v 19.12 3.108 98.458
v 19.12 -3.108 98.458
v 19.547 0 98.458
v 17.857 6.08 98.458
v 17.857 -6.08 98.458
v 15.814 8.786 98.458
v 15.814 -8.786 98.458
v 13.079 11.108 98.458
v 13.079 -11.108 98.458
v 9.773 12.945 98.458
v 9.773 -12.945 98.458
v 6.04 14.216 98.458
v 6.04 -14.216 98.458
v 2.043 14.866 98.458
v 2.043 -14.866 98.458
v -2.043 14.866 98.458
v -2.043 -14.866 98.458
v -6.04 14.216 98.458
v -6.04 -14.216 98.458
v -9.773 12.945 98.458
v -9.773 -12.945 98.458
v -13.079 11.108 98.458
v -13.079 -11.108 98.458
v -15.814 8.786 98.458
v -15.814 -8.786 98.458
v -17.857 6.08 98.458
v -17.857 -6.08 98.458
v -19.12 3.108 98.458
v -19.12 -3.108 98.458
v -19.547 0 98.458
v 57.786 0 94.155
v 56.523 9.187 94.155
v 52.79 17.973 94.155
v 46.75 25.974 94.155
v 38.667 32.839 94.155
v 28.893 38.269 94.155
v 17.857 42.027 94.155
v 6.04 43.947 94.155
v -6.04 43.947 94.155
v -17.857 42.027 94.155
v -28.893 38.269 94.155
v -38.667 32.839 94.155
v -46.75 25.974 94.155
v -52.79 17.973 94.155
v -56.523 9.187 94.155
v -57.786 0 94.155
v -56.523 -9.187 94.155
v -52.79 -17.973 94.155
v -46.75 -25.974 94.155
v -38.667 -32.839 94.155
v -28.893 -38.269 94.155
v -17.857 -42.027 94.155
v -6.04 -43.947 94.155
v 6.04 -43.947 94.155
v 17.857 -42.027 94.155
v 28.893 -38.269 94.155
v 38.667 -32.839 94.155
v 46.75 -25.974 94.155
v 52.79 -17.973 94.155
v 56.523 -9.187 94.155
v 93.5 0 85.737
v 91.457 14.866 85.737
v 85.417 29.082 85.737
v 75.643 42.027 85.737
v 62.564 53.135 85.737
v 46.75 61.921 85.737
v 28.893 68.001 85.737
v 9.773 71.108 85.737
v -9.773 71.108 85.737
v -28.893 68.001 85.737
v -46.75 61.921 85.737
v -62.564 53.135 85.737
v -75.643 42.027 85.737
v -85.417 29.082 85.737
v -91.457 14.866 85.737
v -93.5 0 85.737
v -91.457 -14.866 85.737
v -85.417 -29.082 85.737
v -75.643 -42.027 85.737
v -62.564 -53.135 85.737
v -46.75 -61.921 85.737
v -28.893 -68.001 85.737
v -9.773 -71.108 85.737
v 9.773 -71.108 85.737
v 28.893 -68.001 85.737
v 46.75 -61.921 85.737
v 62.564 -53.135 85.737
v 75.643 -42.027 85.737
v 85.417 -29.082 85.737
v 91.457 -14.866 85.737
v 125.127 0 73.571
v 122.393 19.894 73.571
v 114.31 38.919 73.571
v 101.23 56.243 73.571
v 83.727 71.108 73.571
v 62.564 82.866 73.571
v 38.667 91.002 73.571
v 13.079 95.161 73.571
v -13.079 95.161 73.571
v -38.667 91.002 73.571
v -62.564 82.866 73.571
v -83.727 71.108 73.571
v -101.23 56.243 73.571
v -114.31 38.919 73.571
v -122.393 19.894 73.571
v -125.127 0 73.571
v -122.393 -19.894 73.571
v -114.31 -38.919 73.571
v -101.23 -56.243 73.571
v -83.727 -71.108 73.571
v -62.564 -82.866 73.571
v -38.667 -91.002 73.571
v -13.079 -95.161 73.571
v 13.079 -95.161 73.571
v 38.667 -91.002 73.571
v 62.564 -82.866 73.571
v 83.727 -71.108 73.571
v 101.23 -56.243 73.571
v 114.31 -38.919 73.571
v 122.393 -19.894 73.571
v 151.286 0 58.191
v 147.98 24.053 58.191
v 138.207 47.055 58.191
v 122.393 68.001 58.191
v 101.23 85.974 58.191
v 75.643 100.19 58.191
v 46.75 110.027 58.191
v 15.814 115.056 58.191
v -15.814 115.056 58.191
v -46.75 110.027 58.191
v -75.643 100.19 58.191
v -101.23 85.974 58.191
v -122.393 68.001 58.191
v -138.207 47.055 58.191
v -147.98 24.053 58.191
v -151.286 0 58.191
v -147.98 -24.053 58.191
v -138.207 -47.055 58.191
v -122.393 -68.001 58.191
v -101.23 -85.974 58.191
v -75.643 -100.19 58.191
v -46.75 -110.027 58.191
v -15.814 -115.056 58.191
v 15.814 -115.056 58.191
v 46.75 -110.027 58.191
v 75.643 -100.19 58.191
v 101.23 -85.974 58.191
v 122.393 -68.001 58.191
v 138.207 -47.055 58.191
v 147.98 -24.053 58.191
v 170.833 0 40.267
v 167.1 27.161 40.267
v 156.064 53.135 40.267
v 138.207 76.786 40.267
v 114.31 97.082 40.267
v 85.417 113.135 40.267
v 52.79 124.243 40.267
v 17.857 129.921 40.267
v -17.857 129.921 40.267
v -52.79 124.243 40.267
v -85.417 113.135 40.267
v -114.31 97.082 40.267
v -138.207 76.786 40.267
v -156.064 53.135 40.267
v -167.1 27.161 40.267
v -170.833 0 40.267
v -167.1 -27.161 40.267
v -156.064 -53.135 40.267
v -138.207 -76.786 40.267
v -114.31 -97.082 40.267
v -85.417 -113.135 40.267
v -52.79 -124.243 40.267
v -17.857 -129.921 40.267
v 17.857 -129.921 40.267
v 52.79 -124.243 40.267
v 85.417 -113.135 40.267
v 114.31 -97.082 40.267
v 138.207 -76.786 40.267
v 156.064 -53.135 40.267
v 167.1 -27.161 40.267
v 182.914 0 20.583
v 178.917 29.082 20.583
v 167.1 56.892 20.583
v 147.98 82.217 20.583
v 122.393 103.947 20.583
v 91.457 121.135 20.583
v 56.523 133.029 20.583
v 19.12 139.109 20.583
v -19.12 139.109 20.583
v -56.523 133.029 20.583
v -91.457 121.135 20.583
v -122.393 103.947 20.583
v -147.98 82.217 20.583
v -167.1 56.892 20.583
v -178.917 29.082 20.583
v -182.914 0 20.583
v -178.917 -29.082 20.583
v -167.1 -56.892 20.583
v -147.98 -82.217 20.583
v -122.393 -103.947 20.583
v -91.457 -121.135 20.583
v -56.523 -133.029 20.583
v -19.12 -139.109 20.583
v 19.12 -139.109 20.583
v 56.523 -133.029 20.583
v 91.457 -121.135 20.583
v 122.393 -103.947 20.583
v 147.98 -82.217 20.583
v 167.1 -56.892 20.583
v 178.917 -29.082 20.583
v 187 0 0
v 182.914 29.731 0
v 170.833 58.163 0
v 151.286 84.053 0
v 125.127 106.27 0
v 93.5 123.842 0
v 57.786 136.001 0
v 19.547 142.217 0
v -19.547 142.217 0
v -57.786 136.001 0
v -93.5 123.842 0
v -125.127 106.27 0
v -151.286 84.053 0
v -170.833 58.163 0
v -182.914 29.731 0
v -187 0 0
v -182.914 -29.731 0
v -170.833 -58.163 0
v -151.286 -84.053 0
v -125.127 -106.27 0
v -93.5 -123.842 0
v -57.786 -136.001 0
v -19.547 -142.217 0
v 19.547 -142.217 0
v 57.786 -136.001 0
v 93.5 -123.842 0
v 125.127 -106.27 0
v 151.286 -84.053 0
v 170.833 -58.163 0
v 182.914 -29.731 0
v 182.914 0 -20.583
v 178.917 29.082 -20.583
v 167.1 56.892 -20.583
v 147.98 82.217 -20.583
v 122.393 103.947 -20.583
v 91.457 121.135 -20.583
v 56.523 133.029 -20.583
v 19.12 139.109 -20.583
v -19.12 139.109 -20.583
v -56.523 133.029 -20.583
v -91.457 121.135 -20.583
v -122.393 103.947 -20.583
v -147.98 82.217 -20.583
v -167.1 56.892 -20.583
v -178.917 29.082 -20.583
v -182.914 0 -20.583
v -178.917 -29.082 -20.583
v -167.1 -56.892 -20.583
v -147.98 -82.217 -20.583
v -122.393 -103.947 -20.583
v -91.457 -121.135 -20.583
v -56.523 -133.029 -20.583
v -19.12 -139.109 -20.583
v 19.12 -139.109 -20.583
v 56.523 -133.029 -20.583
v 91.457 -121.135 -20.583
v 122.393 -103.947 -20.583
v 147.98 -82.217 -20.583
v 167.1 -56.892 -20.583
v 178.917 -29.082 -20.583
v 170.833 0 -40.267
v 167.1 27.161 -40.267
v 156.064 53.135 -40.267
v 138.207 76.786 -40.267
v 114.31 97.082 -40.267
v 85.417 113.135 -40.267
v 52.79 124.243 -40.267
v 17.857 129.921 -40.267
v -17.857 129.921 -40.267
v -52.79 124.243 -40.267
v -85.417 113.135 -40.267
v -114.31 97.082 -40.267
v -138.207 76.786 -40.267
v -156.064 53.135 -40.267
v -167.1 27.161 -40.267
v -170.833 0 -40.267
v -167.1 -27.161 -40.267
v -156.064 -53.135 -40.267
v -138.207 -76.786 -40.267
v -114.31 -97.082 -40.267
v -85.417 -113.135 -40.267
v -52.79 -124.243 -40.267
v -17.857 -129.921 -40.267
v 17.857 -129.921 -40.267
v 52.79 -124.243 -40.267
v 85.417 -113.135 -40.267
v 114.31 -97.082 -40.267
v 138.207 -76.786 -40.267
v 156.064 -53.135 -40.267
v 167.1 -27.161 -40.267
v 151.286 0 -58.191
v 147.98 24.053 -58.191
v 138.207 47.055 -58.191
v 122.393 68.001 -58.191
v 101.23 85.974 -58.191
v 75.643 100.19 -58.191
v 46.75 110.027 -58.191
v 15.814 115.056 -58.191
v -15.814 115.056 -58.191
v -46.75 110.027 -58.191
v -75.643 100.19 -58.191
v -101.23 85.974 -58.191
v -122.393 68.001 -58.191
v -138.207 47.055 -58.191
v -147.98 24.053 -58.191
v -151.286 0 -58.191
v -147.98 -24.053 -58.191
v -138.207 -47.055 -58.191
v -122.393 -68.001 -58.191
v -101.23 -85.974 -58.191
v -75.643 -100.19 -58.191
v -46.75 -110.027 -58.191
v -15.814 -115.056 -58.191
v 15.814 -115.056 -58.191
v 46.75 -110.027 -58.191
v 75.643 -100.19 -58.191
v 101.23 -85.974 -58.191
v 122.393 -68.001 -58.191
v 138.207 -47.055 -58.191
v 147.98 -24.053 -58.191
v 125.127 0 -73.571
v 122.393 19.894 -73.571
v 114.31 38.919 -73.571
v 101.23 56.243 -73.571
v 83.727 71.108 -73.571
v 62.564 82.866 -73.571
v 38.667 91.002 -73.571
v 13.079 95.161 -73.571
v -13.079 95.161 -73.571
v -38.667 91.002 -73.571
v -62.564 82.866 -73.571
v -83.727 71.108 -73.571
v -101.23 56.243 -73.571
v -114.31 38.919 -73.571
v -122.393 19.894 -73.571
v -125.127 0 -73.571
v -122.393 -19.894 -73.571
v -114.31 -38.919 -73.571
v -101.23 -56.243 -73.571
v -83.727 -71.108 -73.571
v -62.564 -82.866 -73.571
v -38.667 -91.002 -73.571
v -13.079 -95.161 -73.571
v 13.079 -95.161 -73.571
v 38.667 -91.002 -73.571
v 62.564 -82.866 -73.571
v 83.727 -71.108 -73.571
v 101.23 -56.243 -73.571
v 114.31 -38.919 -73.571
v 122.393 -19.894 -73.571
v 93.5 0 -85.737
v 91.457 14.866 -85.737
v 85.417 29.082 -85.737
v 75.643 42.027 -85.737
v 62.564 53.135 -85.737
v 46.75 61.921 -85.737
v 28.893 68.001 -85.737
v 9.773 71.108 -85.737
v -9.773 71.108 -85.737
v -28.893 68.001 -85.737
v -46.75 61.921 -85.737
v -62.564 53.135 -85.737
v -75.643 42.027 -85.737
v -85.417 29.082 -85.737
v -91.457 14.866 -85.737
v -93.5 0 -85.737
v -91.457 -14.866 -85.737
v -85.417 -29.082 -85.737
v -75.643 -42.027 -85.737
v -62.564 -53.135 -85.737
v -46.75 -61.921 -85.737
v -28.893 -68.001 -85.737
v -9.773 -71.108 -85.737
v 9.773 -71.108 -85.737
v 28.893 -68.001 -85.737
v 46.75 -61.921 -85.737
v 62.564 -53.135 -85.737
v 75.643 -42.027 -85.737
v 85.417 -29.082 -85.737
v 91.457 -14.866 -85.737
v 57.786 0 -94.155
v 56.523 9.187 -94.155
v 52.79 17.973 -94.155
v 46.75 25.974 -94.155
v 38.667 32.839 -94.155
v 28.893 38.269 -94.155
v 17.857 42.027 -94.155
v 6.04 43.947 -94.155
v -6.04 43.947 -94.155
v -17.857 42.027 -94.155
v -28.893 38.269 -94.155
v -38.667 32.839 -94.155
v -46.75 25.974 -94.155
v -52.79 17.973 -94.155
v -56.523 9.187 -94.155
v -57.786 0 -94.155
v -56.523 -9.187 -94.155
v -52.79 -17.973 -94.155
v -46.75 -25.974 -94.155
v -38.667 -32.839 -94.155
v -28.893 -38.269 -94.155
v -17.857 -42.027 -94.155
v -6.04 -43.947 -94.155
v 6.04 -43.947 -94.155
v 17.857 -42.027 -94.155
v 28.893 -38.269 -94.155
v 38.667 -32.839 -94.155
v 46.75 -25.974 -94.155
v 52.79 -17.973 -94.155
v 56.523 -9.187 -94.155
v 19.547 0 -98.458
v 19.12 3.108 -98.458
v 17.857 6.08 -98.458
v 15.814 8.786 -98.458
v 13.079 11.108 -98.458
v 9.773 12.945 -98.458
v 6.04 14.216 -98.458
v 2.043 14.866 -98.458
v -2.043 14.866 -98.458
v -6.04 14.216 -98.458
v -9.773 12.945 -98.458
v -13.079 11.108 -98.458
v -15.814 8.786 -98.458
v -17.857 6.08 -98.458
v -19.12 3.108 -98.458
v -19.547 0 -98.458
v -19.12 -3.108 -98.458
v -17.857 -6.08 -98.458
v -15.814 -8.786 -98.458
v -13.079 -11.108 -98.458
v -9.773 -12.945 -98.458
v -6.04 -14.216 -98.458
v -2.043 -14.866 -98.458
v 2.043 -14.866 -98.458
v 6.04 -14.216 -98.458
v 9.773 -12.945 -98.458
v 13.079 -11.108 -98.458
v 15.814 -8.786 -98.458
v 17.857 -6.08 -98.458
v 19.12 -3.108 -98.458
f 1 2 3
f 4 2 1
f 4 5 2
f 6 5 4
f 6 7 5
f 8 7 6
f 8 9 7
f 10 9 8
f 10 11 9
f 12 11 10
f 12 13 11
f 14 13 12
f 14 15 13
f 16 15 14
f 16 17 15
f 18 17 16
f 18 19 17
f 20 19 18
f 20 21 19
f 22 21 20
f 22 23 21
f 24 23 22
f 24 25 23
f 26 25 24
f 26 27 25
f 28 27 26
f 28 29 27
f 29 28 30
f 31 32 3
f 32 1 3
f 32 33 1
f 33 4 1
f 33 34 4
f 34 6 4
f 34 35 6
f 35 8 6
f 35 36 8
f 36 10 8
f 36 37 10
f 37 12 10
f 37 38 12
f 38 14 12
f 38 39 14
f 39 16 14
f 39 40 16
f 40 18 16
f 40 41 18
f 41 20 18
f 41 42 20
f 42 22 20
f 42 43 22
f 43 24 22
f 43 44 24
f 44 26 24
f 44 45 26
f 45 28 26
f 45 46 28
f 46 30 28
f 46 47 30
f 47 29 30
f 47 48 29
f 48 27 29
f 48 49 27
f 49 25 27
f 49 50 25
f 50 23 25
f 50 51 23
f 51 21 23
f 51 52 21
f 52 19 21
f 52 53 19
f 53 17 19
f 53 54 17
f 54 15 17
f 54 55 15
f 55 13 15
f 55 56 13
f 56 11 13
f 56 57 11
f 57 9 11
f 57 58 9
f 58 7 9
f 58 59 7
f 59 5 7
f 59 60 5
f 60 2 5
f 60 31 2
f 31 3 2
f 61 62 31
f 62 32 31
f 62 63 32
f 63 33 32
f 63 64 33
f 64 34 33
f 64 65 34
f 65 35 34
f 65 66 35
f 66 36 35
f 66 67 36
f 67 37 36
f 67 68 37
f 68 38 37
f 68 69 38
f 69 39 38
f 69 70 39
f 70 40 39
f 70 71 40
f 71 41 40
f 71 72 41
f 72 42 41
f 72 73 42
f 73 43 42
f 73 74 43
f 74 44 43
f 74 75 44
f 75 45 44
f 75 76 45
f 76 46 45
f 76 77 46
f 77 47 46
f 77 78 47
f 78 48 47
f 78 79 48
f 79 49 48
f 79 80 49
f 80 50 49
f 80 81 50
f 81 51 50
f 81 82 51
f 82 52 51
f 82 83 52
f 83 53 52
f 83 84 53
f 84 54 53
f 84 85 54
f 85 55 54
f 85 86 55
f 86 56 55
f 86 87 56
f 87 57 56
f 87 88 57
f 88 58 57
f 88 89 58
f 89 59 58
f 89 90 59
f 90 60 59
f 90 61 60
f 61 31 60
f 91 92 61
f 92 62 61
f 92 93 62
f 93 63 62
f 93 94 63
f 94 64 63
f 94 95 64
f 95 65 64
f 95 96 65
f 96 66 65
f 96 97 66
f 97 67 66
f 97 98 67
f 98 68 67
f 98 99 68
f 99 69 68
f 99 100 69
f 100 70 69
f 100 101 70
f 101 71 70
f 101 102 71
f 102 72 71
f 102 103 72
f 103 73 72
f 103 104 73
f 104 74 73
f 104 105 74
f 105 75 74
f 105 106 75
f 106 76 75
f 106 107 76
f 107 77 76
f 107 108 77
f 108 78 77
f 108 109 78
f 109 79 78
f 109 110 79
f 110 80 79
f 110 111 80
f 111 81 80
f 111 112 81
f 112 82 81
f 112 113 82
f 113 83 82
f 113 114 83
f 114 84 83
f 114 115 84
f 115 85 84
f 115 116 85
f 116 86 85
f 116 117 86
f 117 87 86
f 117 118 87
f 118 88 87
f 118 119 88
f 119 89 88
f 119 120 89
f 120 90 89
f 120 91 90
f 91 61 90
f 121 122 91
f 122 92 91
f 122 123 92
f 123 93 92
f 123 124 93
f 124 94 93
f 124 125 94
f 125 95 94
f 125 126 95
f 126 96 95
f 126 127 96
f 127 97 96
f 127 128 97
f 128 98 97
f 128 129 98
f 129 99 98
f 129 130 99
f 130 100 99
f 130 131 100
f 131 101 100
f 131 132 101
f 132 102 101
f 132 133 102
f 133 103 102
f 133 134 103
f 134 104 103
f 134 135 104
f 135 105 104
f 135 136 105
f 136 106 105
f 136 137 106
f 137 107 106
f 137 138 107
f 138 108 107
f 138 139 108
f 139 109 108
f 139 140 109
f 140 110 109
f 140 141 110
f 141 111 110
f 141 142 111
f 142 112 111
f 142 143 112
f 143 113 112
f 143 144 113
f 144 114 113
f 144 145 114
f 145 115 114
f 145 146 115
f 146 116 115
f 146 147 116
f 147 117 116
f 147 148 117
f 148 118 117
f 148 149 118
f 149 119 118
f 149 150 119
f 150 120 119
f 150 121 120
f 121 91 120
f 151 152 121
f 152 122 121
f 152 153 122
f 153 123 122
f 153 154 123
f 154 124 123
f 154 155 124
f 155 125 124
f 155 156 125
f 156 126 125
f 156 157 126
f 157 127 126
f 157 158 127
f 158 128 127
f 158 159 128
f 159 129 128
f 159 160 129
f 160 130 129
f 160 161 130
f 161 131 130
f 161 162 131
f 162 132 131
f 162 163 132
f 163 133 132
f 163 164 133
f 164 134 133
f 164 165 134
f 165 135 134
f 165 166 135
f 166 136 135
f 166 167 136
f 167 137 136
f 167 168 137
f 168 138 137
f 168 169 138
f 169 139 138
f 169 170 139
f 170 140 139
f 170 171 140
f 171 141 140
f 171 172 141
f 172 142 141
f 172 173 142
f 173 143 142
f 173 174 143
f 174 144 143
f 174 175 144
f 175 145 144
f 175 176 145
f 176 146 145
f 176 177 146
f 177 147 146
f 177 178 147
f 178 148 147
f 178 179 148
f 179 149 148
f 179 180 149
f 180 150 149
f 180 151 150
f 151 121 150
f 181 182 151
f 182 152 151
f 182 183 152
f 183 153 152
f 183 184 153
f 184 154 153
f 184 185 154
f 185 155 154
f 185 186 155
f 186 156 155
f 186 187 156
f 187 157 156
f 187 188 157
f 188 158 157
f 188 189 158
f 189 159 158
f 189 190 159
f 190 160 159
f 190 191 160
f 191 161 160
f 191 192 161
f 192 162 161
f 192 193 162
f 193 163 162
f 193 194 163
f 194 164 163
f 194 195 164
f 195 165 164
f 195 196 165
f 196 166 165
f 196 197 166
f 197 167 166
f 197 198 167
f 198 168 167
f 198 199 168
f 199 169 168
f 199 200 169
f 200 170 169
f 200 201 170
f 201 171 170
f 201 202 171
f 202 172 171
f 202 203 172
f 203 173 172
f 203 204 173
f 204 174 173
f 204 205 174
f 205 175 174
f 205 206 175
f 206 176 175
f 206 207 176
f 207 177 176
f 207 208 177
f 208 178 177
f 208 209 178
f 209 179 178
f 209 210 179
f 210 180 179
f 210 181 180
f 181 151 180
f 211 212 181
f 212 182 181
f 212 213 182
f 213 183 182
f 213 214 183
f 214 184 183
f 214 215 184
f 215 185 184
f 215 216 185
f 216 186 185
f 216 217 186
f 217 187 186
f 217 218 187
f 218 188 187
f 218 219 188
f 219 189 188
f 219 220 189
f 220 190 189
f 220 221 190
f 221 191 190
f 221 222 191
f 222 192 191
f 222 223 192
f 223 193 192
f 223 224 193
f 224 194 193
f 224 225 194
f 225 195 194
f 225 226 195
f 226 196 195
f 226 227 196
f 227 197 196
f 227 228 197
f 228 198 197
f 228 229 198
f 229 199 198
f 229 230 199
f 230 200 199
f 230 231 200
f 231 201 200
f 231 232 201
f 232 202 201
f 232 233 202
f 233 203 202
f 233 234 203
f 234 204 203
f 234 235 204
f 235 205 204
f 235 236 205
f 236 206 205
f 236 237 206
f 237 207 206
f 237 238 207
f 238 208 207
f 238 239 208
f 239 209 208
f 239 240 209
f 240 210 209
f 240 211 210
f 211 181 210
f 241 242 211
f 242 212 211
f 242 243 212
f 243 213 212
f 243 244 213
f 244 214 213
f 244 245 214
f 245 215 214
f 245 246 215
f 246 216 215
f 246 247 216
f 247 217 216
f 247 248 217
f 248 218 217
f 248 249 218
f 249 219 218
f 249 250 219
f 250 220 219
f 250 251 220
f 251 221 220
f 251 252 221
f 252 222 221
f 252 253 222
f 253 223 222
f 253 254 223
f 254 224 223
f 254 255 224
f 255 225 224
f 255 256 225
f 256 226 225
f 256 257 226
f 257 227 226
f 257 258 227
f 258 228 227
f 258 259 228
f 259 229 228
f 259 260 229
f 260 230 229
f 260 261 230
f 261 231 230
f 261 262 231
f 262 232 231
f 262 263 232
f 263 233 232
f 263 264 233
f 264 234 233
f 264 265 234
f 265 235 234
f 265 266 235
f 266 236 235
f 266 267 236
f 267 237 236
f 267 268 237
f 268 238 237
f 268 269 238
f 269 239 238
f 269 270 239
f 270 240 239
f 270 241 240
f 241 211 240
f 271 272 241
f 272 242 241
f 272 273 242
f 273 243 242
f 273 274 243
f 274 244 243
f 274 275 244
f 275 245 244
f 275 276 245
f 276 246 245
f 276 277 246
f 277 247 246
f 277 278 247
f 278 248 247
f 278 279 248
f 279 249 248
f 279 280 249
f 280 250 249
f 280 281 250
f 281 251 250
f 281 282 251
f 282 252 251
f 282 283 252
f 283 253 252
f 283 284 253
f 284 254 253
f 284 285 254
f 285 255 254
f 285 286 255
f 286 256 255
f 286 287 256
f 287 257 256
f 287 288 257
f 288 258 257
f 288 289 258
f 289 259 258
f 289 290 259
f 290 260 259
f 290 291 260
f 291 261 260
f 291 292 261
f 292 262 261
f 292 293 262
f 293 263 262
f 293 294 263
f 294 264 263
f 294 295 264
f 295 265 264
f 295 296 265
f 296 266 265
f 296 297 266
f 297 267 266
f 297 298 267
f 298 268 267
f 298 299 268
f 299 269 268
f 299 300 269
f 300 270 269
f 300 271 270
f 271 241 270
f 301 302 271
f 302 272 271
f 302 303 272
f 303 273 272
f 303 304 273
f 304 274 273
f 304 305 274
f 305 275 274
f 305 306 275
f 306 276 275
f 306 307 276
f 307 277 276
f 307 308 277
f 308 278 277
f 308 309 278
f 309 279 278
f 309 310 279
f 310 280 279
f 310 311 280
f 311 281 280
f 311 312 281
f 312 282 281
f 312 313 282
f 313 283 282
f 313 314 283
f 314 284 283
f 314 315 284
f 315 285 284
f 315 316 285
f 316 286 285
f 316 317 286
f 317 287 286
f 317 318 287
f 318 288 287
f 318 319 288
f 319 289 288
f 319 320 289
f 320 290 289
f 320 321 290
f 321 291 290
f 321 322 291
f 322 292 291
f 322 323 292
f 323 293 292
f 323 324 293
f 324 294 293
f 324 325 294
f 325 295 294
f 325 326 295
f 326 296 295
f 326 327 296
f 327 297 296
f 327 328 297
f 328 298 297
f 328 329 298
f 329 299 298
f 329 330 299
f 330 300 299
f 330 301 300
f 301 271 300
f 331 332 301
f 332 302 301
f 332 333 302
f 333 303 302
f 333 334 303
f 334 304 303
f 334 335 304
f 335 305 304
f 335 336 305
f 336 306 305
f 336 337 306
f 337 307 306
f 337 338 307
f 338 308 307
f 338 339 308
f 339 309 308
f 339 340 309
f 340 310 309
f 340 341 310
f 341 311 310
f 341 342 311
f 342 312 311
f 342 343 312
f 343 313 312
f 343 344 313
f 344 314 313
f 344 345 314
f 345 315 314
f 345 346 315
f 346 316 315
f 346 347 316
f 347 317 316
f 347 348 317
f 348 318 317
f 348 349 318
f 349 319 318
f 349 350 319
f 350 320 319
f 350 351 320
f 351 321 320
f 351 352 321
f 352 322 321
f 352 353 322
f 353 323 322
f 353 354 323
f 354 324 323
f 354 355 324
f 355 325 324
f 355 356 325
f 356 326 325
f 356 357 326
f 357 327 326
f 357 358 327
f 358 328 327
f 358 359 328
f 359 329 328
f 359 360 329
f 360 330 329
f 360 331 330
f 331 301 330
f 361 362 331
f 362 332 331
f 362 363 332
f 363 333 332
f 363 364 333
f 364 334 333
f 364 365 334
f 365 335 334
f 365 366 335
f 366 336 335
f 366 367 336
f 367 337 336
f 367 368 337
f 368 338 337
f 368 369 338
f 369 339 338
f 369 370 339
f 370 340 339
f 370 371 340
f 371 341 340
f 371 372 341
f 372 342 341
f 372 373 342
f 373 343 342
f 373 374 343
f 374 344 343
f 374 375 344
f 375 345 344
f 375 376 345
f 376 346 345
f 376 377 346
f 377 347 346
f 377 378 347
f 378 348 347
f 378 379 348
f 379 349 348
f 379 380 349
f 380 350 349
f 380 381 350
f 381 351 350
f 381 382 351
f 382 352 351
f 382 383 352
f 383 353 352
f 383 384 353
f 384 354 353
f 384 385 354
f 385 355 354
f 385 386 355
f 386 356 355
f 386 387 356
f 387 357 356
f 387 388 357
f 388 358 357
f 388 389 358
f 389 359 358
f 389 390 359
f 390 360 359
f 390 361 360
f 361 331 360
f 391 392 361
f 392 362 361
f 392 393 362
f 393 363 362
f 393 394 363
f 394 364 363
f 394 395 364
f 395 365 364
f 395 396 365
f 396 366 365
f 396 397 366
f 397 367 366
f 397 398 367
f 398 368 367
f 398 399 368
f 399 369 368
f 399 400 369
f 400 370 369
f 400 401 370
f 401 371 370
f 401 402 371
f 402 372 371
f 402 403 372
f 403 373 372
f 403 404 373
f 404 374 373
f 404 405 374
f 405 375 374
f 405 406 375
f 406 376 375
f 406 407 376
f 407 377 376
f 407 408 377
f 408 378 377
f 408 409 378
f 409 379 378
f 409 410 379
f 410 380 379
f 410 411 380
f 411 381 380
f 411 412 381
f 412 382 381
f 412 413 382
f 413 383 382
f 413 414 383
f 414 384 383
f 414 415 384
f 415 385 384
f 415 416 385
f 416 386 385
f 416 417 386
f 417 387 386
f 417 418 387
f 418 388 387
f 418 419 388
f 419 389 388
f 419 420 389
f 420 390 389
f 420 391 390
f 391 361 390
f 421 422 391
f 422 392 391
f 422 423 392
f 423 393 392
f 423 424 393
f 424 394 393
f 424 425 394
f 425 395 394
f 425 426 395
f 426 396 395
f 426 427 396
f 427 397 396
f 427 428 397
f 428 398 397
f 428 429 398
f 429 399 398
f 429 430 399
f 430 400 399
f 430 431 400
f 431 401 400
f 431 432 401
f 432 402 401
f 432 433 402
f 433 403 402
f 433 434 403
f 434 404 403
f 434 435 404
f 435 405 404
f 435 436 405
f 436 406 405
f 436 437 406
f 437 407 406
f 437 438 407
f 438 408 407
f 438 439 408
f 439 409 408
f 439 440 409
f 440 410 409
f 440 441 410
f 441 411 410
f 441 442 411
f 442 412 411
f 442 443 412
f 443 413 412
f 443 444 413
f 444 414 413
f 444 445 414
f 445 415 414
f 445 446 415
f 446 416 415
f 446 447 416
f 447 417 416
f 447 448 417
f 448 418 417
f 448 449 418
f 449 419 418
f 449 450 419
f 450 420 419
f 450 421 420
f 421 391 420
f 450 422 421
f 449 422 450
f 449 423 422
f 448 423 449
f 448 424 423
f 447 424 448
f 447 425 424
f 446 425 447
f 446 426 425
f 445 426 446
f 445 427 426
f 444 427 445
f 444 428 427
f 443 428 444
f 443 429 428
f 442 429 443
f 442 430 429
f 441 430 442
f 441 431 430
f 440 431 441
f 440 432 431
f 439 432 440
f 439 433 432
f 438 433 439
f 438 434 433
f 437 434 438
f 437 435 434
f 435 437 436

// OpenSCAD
// Generated by SolidPython 1.0.1 on 2020-07-29 00:46:53


scale(v = [17, 13, 9]) {
	sphere(r = 11);
}
/***********************************************
*********      SolidPython code:      **********
************************************************
 
# import packages: SolidPython
from solid import *
from solid.utils import *
from itertools import chain, combinations, permutations


class Resize:

    def __init__(self, scad_file):
        self.scad_file = scad_file
        #self.scad_file = import_scad(scad_file)
        # cone/cylinder param:
        self.r1 = 0
        self.r2 = 0
        self.h = 0
        # rectangular prism param:
        self.w = 0
        self.l = 0
        # ellipse param:
        self.r = 0

    # import OpenScad code (file name corresponds to shape)


    # classify shape + parameters
    def assign(self, param1, param2, param3):
        if self.scad_file == 'cone.scad':
            self.r1 = param1
            self.r2 = param2
            self.h = param3
        elif self.scad_file == 'cylinder.scad':
            self.r1 = param1
            self.r2 = param2
            self.h = param3
        elif self.scad_file == 'rectangularPrism.scad':
            self.h = param1
            self.l = param2
            self.w = param3
        else:
            self.r = param1
            self.h = param2

    # resize parameters
    def iterate(self):
        x = range(3, 20, 2)
        i = 1
        if self.scad_file == 'cone.scad':
            tempList = list(permutations(x, 2))
            for temp in tempList:
                param1 = temp[0]
                param2 = temp[1]
                filepath = 'produced_scad_files/' + 'cone' + str(param1) + '_' + str(param2) + '_' + '.scad'
                scad_render_to_file(cylinder(h=param1, r1=param2, r2=0), filepath)

        elif self.scad_file == 'cylinder.scad':
            tempList = list(permutations(x, 3))
            for temp in tempList:
                param1 = temp[0]
                param2 = temp[1]
                filepath = 'produced_scad_files/' + 'cylinder' + str(param1) + '_' + str(param2) + '_' + '.scad'
                scad_render_to_file(cylinder(h=param1, r1=param2, r2=param2), filepath)

        elif self.scad_file == 'rectangularPrism.scad':
            tempList = list(permutations(x, 3))
            for temp in tempList:
                param1 = temp[0]
                param2 = temp[1]
                param3 = temp[2]
                filepath = 'produced_scad_files/' + 'rectangularPrism' + str(param1) + '_' + str(param2) + '_' + str(
                    param3) + '.scad'
                scad_render_to_file(cube(size=(param1, param2, param3)), filepath)

        elif self.scad_file == 'ellipse.scad':
            tempList = list(permutations(x, 4))
            for temp in tempList:
                param1 = temp[0]
                param2 = temp[1]
                param3 = temp[2]
                param4 = temp[3]
                filepath = 'produced_scad_files/' + 'ellipse' + str(param1) + '_' + str(param2) + '_' + str(param3) + '_' + str(param4) + '.scad'
                scad_render_to_file(scale([param1, param2, param3])(sphere(r=param4)), filepath)

    def render_to_scadfile(self):
        scad_render_to_file(scad, 'example.scad') 
 
************************************************/
